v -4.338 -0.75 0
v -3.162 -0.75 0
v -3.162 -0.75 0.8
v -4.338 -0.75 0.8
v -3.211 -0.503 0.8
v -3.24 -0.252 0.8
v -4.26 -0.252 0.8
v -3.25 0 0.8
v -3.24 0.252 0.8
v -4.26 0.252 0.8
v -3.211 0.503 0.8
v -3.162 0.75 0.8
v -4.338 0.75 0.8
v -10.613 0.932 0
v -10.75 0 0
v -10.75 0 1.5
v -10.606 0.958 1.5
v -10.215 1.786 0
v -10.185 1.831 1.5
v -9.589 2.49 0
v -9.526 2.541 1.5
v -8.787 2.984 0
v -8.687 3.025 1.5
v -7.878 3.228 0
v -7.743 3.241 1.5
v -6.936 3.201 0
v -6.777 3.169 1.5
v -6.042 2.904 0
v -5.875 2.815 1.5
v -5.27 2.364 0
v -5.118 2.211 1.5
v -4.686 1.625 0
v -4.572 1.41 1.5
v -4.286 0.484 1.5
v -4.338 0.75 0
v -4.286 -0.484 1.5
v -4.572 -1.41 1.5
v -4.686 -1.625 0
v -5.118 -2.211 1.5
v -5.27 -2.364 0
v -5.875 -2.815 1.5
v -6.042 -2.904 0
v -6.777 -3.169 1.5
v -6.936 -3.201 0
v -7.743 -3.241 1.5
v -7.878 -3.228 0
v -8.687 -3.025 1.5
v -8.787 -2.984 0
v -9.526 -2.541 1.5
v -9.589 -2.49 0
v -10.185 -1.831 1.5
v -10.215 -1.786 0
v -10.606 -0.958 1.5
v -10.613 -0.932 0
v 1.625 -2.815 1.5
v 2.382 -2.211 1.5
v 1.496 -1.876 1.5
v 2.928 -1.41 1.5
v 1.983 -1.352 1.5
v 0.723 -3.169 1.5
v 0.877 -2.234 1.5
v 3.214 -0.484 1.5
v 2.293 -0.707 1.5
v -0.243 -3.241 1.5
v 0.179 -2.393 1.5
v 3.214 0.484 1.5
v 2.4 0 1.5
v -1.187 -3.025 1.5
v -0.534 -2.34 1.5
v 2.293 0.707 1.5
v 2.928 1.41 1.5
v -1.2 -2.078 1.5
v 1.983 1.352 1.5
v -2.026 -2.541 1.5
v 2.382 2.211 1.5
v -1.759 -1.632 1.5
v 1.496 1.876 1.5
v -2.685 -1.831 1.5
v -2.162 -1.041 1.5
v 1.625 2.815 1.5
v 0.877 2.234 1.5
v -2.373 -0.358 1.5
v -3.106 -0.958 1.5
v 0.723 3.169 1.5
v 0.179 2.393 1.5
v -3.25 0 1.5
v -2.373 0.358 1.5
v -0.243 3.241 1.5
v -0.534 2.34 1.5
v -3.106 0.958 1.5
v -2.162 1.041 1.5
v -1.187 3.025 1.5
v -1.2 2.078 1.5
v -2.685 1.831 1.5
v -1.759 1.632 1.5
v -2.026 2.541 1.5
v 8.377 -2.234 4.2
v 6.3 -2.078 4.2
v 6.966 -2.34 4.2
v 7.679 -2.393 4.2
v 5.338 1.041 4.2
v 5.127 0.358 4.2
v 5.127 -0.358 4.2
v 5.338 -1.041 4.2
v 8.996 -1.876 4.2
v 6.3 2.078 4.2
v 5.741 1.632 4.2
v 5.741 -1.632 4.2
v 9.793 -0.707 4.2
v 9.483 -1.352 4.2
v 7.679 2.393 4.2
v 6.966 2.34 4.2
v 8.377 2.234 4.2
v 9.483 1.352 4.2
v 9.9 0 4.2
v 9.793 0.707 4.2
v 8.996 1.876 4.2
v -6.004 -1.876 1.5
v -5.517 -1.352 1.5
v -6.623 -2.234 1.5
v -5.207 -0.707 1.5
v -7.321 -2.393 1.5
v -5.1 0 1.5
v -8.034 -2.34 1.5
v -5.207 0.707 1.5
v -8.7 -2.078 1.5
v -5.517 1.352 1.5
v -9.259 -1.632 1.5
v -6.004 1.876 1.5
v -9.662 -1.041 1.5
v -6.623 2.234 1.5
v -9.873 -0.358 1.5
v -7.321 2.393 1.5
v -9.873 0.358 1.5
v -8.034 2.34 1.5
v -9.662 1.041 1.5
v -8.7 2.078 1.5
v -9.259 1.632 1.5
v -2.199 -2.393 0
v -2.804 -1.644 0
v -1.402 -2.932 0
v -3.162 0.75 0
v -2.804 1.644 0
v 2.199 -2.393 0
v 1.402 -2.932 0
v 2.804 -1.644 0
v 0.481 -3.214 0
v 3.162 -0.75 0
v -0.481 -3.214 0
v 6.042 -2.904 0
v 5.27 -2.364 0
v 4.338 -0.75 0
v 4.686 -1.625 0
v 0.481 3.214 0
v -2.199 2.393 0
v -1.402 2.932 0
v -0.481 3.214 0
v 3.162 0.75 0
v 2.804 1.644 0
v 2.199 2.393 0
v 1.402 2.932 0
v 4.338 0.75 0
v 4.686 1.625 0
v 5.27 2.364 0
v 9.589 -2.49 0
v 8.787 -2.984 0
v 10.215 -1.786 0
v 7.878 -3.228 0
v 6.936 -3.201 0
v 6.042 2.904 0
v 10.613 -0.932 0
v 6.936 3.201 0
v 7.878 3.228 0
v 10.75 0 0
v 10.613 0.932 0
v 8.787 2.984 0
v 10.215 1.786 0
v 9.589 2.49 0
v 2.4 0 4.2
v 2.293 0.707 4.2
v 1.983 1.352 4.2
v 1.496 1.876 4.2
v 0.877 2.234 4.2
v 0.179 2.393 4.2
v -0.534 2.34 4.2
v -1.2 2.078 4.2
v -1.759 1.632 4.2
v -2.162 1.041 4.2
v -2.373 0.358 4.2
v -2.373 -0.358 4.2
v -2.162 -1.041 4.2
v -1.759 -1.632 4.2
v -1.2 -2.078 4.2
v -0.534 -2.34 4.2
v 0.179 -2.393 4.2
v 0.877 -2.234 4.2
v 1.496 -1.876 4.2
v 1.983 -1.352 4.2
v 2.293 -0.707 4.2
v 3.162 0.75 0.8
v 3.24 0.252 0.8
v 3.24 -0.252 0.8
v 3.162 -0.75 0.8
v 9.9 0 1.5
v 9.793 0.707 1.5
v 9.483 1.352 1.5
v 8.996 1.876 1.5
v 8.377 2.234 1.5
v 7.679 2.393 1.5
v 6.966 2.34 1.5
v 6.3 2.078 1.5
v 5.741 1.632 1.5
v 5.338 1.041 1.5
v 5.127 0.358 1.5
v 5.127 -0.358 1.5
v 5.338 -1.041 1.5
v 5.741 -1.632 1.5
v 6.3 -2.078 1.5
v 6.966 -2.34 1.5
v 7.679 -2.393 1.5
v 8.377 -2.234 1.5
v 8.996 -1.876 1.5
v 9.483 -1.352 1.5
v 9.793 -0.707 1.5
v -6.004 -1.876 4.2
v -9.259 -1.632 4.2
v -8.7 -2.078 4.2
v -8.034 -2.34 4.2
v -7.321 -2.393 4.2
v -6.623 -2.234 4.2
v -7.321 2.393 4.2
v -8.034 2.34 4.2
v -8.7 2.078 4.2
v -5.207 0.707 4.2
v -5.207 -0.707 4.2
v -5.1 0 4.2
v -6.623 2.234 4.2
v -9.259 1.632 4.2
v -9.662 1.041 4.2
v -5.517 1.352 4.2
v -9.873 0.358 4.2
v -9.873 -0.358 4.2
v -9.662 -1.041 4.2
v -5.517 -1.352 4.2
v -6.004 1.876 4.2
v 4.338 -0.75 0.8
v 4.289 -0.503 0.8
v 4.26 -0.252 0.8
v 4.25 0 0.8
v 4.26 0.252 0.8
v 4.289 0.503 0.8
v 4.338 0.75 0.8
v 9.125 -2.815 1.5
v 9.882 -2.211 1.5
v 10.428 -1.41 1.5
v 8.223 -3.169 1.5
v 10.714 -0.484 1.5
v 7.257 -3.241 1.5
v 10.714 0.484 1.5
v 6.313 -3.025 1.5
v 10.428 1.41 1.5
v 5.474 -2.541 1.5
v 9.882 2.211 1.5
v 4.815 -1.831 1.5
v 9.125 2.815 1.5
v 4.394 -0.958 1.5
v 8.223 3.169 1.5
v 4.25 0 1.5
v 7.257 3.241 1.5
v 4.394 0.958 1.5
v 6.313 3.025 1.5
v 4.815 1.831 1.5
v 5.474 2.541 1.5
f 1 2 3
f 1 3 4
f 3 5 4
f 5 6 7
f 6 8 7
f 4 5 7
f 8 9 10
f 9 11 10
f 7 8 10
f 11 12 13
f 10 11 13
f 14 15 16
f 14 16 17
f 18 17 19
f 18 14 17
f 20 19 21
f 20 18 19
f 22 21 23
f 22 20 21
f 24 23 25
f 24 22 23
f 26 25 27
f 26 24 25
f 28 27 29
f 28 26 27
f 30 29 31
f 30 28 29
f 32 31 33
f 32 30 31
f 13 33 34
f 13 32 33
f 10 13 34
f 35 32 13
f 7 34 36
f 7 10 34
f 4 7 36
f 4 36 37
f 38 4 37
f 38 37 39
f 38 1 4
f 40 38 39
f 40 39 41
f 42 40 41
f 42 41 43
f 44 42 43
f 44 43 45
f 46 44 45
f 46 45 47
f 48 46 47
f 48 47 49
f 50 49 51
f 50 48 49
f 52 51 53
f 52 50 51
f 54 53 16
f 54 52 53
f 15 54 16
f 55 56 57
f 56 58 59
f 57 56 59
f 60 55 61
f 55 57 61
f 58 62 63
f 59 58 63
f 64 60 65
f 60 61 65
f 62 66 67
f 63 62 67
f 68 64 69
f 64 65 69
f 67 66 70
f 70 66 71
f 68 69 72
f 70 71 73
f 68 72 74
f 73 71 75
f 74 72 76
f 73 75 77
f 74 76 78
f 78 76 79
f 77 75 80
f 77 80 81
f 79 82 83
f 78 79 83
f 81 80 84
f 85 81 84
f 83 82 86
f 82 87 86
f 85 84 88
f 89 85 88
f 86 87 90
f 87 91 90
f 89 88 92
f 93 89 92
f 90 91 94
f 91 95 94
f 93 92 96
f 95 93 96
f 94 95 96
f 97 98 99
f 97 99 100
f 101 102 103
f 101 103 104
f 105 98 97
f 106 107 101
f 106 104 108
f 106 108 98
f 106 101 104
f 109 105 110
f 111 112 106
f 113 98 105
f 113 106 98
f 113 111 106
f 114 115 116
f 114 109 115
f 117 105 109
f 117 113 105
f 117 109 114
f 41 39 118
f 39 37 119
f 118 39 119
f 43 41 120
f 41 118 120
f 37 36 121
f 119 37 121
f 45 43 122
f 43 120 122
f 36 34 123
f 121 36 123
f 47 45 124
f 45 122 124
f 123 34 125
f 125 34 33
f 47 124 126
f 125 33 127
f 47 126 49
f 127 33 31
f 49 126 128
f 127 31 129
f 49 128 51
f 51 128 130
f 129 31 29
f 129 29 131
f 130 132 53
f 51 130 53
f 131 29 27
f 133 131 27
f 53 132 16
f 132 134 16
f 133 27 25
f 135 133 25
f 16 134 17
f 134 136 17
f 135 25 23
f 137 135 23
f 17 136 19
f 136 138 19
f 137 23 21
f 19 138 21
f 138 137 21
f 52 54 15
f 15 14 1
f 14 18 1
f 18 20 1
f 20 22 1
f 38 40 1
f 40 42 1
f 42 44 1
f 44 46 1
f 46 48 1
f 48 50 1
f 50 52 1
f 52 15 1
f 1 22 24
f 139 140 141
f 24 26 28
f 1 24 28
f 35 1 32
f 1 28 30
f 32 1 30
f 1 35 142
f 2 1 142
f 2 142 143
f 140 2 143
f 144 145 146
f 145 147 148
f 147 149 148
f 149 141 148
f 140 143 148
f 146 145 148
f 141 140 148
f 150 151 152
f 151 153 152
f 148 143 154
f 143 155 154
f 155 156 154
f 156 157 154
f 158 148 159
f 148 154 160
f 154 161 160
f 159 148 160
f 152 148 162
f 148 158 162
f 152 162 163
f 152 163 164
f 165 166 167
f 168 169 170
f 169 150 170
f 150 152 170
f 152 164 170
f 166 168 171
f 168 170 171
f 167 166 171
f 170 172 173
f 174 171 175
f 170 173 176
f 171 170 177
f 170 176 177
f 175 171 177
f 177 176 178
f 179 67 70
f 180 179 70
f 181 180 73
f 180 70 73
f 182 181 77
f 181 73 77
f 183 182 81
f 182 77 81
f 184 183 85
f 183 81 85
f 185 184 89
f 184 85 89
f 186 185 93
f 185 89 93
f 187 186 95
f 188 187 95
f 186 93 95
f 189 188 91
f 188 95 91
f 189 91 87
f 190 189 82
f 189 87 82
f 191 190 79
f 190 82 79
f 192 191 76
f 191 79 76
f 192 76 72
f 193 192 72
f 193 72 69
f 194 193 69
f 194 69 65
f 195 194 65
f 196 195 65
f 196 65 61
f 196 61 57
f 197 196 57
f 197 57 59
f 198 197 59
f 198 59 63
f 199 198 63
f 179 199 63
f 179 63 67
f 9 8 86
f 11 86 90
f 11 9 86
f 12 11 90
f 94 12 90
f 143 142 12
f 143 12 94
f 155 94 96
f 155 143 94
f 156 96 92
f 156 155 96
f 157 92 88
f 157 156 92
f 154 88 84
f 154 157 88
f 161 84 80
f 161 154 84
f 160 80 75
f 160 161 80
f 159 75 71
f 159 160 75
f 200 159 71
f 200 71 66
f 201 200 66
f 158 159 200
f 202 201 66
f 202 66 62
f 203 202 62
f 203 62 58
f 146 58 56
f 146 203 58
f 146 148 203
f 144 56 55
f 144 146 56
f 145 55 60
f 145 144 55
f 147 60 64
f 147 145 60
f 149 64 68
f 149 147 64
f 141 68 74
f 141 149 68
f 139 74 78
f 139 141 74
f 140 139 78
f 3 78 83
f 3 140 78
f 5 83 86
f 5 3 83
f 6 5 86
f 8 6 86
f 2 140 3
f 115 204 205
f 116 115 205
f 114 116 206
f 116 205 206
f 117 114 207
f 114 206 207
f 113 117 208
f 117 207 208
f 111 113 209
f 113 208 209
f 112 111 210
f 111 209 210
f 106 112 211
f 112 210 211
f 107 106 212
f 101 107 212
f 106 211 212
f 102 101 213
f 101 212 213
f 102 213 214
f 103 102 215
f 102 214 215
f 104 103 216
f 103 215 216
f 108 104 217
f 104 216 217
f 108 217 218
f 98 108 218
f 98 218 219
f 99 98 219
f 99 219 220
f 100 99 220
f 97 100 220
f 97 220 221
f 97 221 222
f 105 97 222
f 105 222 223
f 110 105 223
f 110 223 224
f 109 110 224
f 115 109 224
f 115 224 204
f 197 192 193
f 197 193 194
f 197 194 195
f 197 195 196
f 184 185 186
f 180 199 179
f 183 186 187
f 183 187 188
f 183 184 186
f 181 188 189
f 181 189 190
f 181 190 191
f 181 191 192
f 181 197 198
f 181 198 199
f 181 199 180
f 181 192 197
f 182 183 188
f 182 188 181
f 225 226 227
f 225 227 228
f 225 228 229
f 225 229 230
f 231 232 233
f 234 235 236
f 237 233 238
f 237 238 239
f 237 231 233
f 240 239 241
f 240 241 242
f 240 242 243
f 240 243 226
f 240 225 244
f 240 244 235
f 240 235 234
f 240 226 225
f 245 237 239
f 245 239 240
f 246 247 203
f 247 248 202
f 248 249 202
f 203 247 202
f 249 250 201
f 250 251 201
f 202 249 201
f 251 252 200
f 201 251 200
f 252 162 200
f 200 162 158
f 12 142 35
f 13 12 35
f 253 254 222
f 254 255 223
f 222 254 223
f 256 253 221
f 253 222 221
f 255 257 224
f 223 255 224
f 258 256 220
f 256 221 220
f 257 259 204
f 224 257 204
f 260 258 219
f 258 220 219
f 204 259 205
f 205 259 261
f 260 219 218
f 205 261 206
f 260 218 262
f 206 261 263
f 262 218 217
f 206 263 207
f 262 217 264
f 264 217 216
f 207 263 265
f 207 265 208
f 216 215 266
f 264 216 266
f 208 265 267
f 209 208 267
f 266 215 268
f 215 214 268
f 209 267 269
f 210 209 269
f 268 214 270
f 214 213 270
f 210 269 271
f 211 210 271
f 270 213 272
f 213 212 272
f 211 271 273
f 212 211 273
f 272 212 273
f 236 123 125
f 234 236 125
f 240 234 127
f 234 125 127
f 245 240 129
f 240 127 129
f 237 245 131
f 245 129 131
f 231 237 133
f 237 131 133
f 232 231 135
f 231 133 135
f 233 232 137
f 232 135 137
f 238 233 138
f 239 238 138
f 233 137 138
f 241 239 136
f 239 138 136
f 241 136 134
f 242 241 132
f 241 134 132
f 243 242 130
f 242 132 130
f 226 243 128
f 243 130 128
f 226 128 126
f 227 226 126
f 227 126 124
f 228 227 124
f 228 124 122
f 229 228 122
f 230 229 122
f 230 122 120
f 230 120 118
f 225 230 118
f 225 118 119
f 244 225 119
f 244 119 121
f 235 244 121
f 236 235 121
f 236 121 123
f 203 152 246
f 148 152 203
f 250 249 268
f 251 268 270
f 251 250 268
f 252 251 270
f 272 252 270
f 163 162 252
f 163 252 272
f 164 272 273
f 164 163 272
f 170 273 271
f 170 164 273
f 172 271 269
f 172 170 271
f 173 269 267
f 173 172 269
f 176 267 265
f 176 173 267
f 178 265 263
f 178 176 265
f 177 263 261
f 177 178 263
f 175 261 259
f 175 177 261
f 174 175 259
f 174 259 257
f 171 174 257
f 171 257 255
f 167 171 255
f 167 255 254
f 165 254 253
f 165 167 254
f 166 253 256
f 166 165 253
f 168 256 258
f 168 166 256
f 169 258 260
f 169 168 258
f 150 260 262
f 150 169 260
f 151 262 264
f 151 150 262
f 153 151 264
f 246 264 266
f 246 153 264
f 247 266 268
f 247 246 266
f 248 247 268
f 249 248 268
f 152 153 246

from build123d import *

# Parameters (mm, degrees)
SKETCH1_R             = 2.4
BOSS_EXTRUDE1_DEPTH   = 4.2
BOSS_EXTRUDE1_2_DEPTH = 4.2
BOSS_EXTRUDE1_3_DEPTH = 4.2
SKETCH2_W             = 14.663185534
SKETCH2_H             = 1.5
BOSS_EXTRUDE2_DEPTH   = 0.8
SKETCH3_R             = 3.25
BOSS_EXTRUDE3_DEPTH   = 1.5


with BuildPart() as part:
    # Sketch1 → Boss-Extrude1 (new body)
    with BuildSketch(Plane.XY):
        with Locations((-7.5, 0)):
            Circle(SKETCH1_R)
    extrude(amount=BOSS_EXTRUDE1_DEPTH)



with BuildPart() as body_2:
    # Sketch1 → Boss-Extrude1 2 (new body)
    with BuildSketch(Plane.XY):
        Circle(SKETCH1_R)
    extrude(amount=BOSS_EXTRUDE1_2_DEPTH)


with BuildPart() as body_3:
    # Sketch1 → Boss-Extrude1 3 (new body)
    with BuildSketch(Plane.XY):
        with Locations((7.5, 0)):
            Circle(SKETCH1_R)
    extrude(amount=BOSS_EXTRUDE1_3_DEPTH)


with BuildPart() as part_1:
    add(part.part)

    add(body_2.part)  # Boss-Extrude2 merges body 2

    add(body_3.part)  # Boss-Extrude2 merges body 3
    # Sketch2 → Boss-Extrude2 (add)
    with BuildSketch(Plane(origin=(0, 0, 0), x_dir=(-1, 0, 0), z_dir=(0, 0, -1))):
        Rectangle(SKETCH2_W, SKETCH2_H)
    extrude(amount=-BOSS_EXTRUDE2_DEPTH)

    # Sketch3 → Boss-Extrude3 (add)
    with BuildSketch(Plane(origin=(0, 0, 0), x_dir=(-1, 0, 0), z_dir=(0, 0, -1))):
        Circle(SKETCH3_R)
        with Locations((7.5, 0)):
            Circle(SKETCH3_R)
        with Locations((-7.5, 0)):
            Circle(SKETCH3_R)
    extrude(amount=-BOSS_EXTRUDE3_DEPTH)


solid = part_1.part
